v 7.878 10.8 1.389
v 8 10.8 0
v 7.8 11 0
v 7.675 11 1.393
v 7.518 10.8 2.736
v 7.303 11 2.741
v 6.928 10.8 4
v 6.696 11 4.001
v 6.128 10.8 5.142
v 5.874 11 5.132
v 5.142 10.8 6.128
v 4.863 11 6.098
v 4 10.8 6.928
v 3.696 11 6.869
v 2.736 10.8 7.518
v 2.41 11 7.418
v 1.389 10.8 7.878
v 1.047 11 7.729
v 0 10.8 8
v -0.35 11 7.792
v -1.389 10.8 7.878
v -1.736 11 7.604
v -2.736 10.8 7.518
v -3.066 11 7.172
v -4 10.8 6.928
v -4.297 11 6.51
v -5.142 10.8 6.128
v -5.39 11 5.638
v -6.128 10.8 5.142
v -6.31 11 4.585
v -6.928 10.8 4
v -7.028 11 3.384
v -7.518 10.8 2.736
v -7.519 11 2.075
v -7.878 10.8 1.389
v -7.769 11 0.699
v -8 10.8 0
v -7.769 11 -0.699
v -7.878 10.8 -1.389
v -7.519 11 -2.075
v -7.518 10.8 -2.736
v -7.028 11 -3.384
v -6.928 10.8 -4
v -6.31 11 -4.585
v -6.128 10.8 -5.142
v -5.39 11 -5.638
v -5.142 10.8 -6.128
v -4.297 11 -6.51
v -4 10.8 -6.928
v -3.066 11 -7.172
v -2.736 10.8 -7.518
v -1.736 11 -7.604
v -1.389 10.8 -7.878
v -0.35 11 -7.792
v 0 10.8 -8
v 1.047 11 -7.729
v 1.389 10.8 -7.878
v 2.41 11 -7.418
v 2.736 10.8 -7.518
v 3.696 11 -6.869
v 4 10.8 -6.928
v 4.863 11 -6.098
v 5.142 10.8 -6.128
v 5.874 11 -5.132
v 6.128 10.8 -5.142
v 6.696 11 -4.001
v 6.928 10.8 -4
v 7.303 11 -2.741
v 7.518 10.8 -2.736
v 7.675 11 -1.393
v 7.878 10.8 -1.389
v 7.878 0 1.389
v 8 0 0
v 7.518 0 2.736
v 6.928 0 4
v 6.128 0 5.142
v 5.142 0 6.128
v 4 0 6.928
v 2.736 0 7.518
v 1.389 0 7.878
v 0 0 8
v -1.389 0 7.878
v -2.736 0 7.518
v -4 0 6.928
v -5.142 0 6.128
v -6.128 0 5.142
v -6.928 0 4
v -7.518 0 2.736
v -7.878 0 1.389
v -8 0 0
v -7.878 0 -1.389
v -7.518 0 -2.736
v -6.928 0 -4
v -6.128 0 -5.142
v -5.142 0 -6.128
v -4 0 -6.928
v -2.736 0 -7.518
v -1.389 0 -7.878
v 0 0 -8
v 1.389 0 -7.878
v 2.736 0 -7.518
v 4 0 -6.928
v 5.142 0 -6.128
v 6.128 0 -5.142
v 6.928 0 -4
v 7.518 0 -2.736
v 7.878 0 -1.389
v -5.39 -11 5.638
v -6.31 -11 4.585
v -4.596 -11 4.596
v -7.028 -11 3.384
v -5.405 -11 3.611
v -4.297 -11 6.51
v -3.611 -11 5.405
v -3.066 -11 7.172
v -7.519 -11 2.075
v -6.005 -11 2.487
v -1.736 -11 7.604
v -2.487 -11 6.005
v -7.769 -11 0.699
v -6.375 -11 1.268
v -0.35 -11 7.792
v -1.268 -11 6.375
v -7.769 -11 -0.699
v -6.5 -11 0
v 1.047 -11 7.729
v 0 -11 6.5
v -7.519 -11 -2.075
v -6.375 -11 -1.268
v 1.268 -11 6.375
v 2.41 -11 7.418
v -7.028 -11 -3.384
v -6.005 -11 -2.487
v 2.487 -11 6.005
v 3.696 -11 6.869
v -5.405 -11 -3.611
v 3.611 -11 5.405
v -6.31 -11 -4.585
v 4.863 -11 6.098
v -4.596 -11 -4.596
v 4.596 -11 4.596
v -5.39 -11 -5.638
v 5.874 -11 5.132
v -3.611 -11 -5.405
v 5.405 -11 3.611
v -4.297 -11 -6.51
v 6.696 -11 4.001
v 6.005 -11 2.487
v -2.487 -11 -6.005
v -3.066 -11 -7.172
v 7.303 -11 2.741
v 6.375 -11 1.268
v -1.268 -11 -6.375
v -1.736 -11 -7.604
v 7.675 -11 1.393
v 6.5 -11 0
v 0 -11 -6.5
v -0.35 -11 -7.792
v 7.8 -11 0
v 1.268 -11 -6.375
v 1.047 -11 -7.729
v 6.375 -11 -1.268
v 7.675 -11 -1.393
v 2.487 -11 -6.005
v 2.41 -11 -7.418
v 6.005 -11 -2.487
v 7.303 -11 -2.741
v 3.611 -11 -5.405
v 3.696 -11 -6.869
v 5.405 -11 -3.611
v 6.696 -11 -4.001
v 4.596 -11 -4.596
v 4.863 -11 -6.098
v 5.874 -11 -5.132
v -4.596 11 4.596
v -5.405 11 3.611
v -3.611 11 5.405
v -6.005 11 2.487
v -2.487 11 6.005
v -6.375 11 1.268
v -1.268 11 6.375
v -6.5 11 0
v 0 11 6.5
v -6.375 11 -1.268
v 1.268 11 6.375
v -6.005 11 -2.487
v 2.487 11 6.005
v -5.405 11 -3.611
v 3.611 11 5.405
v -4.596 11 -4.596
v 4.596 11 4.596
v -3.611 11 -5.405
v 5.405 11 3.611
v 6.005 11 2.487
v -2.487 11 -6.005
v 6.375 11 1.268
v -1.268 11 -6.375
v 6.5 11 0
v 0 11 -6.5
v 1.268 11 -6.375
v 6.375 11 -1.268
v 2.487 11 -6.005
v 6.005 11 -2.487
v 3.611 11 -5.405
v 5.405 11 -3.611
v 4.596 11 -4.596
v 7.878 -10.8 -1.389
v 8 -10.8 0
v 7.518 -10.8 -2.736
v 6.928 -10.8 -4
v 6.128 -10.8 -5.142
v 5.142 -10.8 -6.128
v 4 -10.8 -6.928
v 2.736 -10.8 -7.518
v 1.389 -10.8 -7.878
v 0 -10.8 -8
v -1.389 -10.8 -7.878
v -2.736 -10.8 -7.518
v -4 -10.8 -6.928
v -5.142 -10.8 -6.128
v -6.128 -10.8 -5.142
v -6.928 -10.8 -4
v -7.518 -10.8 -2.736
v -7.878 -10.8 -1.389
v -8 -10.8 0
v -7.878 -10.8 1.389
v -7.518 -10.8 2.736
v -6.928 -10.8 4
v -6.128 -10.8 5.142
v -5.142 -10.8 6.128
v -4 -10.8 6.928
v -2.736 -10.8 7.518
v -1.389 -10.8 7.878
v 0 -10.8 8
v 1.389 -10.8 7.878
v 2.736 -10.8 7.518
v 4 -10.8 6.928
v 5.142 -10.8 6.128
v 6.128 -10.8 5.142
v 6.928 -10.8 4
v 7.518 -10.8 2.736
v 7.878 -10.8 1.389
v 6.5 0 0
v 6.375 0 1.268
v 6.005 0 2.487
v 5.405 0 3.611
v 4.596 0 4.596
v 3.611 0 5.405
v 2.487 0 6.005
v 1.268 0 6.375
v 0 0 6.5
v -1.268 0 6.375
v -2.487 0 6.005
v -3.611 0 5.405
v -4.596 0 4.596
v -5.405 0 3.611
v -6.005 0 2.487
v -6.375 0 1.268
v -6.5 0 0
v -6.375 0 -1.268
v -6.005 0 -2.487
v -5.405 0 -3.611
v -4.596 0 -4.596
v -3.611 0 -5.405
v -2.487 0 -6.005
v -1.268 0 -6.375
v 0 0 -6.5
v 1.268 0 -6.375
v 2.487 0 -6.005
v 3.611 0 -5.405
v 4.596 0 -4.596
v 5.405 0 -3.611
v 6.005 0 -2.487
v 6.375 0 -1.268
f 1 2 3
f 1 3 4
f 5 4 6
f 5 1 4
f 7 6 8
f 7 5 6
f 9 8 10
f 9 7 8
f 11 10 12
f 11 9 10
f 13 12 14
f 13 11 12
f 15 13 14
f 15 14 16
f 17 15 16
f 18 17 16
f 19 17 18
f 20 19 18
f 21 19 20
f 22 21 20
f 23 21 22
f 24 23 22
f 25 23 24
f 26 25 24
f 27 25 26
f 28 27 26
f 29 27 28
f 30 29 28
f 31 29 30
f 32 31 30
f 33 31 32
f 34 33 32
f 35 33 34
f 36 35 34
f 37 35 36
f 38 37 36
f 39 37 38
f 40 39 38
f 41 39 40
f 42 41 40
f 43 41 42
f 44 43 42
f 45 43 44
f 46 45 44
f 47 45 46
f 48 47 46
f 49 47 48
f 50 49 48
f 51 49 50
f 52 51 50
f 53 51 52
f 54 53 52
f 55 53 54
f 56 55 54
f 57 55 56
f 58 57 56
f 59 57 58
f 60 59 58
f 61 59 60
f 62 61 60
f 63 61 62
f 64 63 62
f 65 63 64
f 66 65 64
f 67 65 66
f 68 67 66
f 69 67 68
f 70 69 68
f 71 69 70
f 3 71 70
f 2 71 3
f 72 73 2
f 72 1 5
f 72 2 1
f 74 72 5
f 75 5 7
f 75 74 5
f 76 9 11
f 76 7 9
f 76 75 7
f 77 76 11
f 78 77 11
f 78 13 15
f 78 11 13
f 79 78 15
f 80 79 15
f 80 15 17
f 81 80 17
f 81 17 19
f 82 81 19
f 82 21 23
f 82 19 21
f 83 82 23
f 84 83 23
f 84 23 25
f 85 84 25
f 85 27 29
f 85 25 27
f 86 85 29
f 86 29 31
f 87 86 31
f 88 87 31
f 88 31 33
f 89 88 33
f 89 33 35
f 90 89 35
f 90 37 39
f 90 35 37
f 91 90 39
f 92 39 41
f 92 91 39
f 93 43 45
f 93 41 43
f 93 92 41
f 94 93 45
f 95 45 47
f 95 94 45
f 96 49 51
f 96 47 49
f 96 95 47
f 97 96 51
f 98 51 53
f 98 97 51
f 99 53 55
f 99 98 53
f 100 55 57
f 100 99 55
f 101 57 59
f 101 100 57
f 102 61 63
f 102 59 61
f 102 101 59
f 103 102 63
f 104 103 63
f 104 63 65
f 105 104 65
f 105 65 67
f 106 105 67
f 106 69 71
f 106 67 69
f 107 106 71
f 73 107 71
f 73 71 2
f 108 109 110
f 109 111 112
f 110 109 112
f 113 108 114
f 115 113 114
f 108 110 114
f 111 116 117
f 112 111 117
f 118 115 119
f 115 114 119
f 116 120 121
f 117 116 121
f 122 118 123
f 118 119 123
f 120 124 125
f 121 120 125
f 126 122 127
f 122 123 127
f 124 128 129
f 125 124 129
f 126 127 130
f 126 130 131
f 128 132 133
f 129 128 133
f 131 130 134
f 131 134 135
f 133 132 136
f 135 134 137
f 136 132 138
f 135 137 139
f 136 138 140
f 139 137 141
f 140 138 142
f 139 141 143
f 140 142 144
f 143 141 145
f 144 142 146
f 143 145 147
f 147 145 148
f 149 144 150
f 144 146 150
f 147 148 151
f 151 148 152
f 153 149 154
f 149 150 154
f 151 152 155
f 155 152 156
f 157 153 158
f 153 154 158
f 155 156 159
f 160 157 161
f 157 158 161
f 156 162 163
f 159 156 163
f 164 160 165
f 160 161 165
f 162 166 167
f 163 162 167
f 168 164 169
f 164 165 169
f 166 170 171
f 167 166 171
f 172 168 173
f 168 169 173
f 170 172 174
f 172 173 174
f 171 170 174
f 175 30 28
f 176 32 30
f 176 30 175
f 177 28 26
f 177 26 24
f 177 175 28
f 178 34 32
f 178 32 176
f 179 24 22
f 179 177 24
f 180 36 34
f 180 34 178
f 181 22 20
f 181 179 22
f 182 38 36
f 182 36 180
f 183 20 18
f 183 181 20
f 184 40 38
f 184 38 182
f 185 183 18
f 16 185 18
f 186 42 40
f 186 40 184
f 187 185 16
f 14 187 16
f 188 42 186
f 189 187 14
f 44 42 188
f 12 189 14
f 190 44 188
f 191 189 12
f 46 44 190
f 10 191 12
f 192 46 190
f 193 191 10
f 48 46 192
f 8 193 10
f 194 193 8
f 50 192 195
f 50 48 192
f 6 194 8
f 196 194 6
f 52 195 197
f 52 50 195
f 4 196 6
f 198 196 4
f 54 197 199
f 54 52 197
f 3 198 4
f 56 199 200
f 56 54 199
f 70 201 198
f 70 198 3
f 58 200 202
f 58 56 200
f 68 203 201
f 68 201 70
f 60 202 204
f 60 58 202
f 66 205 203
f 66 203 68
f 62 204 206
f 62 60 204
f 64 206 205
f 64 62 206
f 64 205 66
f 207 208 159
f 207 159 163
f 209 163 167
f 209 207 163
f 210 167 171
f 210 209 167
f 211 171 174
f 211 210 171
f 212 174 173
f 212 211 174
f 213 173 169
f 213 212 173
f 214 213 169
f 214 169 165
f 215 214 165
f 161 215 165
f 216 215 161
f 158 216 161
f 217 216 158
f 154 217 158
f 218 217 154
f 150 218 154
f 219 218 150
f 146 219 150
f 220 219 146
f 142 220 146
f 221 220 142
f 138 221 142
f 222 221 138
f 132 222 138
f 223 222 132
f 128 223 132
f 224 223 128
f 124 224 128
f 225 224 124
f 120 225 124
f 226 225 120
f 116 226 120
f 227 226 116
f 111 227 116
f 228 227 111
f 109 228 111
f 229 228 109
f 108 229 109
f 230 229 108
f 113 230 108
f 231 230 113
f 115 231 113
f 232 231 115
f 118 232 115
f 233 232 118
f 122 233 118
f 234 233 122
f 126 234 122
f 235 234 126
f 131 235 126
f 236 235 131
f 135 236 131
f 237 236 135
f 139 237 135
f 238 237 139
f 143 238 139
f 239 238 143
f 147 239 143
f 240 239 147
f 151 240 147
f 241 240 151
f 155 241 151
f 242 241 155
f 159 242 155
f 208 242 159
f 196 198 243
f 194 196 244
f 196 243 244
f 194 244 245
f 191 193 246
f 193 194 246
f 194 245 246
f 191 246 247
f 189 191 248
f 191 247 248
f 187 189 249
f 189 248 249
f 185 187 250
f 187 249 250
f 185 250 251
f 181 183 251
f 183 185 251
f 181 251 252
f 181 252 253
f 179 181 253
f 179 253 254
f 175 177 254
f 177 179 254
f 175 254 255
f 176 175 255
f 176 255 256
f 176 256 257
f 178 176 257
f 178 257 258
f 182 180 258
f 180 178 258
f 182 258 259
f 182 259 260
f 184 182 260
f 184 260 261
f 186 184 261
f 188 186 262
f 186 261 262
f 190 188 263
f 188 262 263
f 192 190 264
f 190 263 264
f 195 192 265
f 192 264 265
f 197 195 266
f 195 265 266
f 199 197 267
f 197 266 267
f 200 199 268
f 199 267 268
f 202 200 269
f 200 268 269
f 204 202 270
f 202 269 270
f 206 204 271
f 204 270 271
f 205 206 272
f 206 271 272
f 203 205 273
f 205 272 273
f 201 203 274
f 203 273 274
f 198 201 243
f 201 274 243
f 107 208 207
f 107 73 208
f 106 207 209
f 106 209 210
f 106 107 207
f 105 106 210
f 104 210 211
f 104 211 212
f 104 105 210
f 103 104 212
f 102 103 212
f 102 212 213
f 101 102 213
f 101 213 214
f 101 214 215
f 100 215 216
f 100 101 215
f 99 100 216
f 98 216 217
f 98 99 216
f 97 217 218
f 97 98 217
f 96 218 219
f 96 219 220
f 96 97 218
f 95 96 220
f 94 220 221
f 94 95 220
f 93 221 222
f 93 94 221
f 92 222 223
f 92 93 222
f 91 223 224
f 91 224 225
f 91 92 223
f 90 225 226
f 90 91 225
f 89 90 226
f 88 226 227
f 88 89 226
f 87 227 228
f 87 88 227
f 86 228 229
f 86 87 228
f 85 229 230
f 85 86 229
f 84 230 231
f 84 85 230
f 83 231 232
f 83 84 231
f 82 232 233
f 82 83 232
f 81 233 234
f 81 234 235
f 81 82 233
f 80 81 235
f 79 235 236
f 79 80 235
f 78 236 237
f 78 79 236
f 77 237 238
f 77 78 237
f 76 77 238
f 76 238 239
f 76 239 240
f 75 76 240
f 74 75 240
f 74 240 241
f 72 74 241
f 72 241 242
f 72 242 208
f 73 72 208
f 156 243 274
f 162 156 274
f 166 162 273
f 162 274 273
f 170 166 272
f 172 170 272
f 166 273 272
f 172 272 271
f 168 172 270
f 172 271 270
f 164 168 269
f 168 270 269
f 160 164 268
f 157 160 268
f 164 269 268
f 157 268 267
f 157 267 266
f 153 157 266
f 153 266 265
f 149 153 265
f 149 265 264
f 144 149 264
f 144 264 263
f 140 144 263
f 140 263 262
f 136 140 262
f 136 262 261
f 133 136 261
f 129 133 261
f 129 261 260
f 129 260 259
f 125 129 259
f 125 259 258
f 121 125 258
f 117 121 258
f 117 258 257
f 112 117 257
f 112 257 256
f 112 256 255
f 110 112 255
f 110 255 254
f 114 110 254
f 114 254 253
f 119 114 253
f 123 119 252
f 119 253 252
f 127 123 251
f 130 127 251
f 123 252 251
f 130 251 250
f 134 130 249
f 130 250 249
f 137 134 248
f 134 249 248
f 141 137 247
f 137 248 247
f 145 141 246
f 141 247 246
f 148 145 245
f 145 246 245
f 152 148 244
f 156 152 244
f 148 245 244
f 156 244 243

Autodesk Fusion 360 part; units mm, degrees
sketch "Sketch1" plane through (0, 0, 0) normal (0, 1, 0) x (1, 0, 0)
  circle A0 centre (0, 0) radius 8
  circle A1 centre (0, 0) radius 6.5
  dimension "d1" = 16
  dimension "d2" = 13
extrude "Extrude1" add sketch "Sketch1" along normal mid plane 22
chamfer "Chamfer1" distance 0.2 angle 45 2 edges at (-7.4586, 11, 2.8929) (-7.4586, -11, -2.8929)
